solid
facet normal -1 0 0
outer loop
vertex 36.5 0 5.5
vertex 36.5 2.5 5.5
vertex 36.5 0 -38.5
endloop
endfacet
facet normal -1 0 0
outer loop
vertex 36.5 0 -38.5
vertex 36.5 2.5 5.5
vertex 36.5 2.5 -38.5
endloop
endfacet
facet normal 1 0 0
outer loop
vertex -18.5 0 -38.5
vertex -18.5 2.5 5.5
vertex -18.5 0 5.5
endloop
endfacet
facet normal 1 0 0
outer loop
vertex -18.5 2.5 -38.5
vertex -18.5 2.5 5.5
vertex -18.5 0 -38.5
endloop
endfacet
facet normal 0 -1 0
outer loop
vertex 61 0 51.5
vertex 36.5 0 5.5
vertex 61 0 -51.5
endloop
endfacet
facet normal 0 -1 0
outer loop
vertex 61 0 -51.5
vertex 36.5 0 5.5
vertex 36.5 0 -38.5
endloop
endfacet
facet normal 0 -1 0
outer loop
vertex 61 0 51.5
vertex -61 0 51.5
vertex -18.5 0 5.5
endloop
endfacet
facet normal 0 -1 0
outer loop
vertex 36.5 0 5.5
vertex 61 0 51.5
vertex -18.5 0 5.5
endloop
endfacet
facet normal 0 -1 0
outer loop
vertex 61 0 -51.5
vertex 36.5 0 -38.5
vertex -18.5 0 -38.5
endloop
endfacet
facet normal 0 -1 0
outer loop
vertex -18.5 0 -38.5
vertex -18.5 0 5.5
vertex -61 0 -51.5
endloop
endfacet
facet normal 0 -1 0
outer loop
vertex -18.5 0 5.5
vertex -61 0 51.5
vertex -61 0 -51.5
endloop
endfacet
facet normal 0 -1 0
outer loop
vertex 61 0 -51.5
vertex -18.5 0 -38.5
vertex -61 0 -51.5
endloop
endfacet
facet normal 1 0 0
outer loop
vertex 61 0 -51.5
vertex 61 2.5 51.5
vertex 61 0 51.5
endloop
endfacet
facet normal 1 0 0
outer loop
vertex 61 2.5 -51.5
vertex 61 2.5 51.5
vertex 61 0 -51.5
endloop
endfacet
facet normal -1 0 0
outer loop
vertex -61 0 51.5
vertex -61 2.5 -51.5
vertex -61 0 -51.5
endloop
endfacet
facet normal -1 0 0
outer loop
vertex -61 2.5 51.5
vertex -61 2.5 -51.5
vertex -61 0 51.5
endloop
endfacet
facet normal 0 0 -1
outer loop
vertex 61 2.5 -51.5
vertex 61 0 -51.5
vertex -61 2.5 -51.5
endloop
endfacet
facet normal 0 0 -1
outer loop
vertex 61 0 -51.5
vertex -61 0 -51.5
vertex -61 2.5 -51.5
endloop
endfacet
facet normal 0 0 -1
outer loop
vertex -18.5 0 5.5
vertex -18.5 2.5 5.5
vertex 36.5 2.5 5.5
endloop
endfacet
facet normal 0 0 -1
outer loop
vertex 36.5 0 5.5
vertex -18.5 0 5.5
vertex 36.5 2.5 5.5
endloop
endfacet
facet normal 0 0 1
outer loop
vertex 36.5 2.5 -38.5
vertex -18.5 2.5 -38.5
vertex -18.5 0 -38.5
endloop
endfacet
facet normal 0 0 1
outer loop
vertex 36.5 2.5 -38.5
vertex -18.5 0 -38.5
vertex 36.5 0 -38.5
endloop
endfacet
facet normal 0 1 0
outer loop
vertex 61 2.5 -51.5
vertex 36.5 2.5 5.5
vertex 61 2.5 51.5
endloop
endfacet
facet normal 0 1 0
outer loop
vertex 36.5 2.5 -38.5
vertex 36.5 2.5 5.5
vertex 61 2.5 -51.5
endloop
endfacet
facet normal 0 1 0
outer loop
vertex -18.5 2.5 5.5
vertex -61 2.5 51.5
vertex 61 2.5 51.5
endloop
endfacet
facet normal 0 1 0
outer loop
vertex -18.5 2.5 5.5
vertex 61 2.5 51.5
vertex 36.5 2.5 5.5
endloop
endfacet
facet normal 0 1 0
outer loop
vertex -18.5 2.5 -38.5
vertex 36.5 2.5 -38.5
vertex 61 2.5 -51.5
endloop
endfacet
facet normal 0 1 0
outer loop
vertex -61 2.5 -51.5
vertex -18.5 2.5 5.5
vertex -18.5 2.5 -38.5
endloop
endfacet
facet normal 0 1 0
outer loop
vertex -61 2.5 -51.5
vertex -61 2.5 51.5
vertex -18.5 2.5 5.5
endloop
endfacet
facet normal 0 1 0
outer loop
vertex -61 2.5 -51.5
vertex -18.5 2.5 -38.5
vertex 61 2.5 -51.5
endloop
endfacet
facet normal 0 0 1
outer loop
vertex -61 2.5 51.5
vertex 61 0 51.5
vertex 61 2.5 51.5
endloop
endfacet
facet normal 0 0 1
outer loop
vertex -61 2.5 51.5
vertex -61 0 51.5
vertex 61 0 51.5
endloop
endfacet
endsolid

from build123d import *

# Parameters (mm, degrees)
SKETCH1_W           = 119
SKETCH1_H           = 103
BOSS_EXTRUDE1_DEPTH = 2.5
SKETCH3_W           = 55
SKETCH3_H           = 44
CUT_EXTRUDE2_DEPTH  = 10
SKETCH4_W           = 103
SKETCH4_H           = 2.5
BOSS_EXTRUDE2_DEPTH = 1.5
SKETCH5_W           = 103
SKETCH5_H           = 2.5
BOSS_EXTRUDE3_DEPTH = 1.5


with BuildPart() as part:
    # Sketch1 → Boss-Extrude1 (new body)
    with BuildSketch(Plane(origin=(0, 0, 0), x_dir=(1, 0, 0), z_dir=(0, 1, 0))):
        Rectangle(SKETCH1_W, SKETCH1_H)
    extrude(amount=BOSS_EXTRUDE1_DEPTH)

    # Sketch3 → Cut-Extrude2 (cut)
    with BuildSketch(Plane(origin=(0, 2.5, 0), x_dir=(1, 0, 0), z_dir=(0, 1, 0))):
        with Locations((9, 16.5)):
            Rectangle(SKETCH3_W, SKETCH3_H)
    extrude(amount=-CUT_EXTRUDE2_DEPTH, mode=Mode.SUBTRACT)

    # Sketch4 → Boss-Extrude2 (add)
    with BuildSketch(Plane.ZY.offset(59.5)):
        with Locations((0, 1.25)):
            Rectangle(SKETCH4_W, SKETCH4_H)
    extrude(amount=BOSS_EXTRUDE2_DEPTH)

    # Sketch5 → Boss-Extrude3 (add)
    with BuildSketch(Plane(origin=(59.5, 0, 0), x_dir=(0, 0, -1), z_dir=(1, 0, 0))):
        with Locations((0, 1.25)):
            Rectangle(SKETCH5_W, SKETCH5_H)
    extrude(amount=BOSS_EXTRUDE3_DEPTH)


solid = part.part
